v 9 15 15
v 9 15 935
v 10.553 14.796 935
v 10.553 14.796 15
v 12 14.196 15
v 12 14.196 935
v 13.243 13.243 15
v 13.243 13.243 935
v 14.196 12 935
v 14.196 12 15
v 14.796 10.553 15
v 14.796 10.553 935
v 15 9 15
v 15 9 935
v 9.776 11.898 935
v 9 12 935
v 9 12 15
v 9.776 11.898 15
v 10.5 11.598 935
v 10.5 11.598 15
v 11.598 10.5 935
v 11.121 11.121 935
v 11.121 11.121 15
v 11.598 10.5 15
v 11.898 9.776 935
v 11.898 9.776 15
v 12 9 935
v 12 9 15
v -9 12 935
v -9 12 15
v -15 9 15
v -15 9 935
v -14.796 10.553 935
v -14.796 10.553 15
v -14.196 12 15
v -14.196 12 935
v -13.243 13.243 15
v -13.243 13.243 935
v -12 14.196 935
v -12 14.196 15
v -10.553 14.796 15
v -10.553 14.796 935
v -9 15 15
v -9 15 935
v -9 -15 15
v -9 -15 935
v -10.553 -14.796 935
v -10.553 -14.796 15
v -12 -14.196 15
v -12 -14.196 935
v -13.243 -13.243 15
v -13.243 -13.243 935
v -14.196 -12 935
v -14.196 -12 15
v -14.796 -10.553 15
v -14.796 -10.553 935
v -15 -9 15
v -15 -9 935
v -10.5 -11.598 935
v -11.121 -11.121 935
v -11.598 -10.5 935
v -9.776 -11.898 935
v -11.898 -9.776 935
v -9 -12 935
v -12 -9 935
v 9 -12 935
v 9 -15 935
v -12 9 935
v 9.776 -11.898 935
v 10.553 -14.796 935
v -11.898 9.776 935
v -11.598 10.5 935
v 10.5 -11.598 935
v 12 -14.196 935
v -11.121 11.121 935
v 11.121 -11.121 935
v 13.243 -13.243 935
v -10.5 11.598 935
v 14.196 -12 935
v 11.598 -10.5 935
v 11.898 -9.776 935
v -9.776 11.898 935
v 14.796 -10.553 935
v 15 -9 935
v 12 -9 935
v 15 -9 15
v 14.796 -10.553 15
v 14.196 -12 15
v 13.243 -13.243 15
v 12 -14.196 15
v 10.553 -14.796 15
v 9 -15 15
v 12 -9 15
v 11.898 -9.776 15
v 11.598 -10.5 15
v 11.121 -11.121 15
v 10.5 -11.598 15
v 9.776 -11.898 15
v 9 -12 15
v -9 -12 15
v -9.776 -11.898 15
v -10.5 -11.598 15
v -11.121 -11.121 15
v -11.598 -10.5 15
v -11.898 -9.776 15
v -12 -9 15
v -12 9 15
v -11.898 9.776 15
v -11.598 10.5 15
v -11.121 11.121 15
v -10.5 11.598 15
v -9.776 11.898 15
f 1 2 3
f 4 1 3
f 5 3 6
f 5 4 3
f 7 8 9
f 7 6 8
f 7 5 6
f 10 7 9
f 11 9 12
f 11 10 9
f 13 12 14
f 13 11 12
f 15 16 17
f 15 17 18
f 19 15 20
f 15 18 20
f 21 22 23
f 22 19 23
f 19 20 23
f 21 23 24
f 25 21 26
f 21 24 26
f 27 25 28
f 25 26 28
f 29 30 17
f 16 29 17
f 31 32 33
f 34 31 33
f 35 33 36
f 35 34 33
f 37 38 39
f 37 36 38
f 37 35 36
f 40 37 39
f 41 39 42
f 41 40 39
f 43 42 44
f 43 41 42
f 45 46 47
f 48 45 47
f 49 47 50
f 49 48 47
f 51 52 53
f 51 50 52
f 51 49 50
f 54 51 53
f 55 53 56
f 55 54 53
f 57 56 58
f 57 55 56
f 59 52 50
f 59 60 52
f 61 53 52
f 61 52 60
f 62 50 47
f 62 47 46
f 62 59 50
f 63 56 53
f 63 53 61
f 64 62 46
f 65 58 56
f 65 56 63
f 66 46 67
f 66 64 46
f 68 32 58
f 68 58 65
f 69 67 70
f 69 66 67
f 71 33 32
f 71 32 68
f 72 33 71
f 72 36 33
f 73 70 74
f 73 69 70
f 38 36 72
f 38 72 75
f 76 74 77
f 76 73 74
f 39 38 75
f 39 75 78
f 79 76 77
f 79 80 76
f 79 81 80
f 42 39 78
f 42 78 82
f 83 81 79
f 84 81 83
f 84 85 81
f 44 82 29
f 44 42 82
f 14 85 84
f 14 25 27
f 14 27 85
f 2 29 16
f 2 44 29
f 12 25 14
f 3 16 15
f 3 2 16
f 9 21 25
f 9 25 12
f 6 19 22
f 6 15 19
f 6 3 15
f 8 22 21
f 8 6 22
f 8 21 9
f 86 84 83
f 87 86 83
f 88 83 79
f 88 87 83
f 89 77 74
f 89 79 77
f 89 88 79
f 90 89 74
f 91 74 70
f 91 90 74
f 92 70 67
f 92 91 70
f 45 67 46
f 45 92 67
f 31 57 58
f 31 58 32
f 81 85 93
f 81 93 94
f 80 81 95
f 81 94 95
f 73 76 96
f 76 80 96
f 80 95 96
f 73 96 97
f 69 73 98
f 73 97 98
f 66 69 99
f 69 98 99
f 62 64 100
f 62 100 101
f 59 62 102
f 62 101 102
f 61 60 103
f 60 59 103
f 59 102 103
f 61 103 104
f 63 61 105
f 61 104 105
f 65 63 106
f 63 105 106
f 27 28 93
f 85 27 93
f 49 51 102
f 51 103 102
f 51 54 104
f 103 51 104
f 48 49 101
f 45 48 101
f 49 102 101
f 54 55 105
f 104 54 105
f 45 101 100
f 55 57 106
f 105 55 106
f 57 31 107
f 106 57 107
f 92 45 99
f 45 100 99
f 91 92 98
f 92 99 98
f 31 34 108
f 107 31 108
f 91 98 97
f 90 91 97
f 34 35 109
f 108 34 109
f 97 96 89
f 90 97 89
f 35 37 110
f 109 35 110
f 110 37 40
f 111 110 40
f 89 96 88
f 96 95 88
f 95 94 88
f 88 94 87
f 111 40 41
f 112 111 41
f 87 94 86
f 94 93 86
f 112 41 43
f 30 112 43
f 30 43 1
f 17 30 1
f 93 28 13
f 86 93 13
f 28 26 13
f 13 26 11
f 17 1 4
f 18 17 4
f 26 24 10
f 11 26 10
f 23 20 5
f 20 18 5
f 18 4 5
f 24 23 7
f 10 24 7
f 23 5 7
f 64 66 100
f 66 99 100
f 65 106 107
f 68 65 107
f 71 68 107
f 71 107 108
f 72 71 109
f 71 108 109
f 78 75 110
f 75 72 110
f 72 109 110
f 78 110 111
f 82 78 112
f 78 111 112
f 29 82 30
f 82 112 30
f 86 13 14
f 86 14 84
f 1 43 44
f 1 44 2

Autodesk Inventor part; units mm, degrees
ref_plane "Start Plane" through (0, 0, 15) normal (0, 0, 1) x (1, 0, 0)
ref_plane "End Plane" through (0, 0, 935) normal (0, 0, 1) x (1, 0, 0)
sketch "Sketch" plane through (0, 0, 0) normal (0, 0, 1) x (1, 0, 0)
  line L0 (-15, -9) -> (-15, 9)
  line L1 (-9, 15) -> (9, 15)
  line L2 (15, 9) -> (15, -9)
  line L3 (9, -15) -> (-9, -15)
  arc A0 (-15, -9) -> (-9, -15) centre (-9, -9) ccw
  arc A1 (-9, 15) -> (-15, 9) centre (-9, 9) ccw
  arc A2 (15, 9) -> (9, 15) centre (9, 9) ccw
  arc A3 (9, -15) -> (15, -9) centre (9, -9) ccw
  arc A4 (-9, 12) -> (-12, 9) centre (-9, 9) ccw
  line L4 (-9, 12) -> (9, 12)
  arc A5 (12, 9) -> (9, 12) centre (9, 9) ccw
  line L5 (12, 9) -> (12, -9)
  arc A6 (9, -12) -> (12, -9) centre (9, -9) ccw
  line L6 (9, -12) -> (-9, -12)
  arc A7 (-12, -9) -> (-9, -12) centre (-9, -9) ccw
  line L7 (-12, -9) -> (-12, 9)
  line L8 (0, 22.7397) -> (0, -22.7397) construction
  line L9 (-22.7397, 0) -> (22.7397, 0) construction
  dimension "d7" = 6
  dimension "d10" = 30
  dimension "d11" = 30
  dimension "d12" = 3
  dimension "d15" = 15
  dimension "d16" = 15
extrude "Body" add sketch "Sketch" along normal up to surface (920 mm away) from surface at 15
sketch "Sketch3" plane through (0, 0, 0) normal (0, 0, 1) x (1, 0, 0)
  line L0 (0, 0) -> (10, 0)
ref_plane "Work Plane3" through (0, 0, 0) normal (0, -1, 0) x (1, 0, 0)
ref_plane "Work Plane4" through (-1731, 0, 15) normal (0, 0, -1) x (-1, 0, 0)
split "Split1" plane through (-1731, 0, 15) removes the side toward (0, 0, -1)
ref_plane "Work Plane5" through (0, -991, 935) normal (0, 0, 1) x (1, 0, 0)
split "Split2" plane through (0, -991, 935) removes the side toward (0, 0, 1)
sketch "Sketch4" plane through (0, 0, 0) normal (0, -1, 0) x (1, 0, 0)
  line L0 (-2, 15) -> (12, 15) projected
  line L1 (-2, 935) -> (12, 935) projected
  dimension "d18" = 920
equation "\"d7\" = G_IR"
equation "\"d10\" = G_H"
equation "\"d11\" = G_W"
equation "\"d12\" = G_T"
equation "\"d15\" = 0.5 * d10"
equation "\"d16\" = 0.5 * d11"
equation "\"d3\" = G_L"
equation "\"G_W\" = 30"
equation "\"G_H\" = 30"
equation "\"G_T\" = 3"
equation "\"G_IR\" = 6"
equation "\"G_L\" = d18"
equation "\"G_OFFSET_START\" = -15"
equation "\"G_OFFSET_END\" = -15"
equation "\"d13\" = -G_OFFSET_START"
equation "\"d14\" = G_OFFSET_END + B_L"
equation "\"B_L\" = 950"
properties part number "DIN EN 10219-2 - 30 x 30 x 3  - 920" material "Steel, Mild"
